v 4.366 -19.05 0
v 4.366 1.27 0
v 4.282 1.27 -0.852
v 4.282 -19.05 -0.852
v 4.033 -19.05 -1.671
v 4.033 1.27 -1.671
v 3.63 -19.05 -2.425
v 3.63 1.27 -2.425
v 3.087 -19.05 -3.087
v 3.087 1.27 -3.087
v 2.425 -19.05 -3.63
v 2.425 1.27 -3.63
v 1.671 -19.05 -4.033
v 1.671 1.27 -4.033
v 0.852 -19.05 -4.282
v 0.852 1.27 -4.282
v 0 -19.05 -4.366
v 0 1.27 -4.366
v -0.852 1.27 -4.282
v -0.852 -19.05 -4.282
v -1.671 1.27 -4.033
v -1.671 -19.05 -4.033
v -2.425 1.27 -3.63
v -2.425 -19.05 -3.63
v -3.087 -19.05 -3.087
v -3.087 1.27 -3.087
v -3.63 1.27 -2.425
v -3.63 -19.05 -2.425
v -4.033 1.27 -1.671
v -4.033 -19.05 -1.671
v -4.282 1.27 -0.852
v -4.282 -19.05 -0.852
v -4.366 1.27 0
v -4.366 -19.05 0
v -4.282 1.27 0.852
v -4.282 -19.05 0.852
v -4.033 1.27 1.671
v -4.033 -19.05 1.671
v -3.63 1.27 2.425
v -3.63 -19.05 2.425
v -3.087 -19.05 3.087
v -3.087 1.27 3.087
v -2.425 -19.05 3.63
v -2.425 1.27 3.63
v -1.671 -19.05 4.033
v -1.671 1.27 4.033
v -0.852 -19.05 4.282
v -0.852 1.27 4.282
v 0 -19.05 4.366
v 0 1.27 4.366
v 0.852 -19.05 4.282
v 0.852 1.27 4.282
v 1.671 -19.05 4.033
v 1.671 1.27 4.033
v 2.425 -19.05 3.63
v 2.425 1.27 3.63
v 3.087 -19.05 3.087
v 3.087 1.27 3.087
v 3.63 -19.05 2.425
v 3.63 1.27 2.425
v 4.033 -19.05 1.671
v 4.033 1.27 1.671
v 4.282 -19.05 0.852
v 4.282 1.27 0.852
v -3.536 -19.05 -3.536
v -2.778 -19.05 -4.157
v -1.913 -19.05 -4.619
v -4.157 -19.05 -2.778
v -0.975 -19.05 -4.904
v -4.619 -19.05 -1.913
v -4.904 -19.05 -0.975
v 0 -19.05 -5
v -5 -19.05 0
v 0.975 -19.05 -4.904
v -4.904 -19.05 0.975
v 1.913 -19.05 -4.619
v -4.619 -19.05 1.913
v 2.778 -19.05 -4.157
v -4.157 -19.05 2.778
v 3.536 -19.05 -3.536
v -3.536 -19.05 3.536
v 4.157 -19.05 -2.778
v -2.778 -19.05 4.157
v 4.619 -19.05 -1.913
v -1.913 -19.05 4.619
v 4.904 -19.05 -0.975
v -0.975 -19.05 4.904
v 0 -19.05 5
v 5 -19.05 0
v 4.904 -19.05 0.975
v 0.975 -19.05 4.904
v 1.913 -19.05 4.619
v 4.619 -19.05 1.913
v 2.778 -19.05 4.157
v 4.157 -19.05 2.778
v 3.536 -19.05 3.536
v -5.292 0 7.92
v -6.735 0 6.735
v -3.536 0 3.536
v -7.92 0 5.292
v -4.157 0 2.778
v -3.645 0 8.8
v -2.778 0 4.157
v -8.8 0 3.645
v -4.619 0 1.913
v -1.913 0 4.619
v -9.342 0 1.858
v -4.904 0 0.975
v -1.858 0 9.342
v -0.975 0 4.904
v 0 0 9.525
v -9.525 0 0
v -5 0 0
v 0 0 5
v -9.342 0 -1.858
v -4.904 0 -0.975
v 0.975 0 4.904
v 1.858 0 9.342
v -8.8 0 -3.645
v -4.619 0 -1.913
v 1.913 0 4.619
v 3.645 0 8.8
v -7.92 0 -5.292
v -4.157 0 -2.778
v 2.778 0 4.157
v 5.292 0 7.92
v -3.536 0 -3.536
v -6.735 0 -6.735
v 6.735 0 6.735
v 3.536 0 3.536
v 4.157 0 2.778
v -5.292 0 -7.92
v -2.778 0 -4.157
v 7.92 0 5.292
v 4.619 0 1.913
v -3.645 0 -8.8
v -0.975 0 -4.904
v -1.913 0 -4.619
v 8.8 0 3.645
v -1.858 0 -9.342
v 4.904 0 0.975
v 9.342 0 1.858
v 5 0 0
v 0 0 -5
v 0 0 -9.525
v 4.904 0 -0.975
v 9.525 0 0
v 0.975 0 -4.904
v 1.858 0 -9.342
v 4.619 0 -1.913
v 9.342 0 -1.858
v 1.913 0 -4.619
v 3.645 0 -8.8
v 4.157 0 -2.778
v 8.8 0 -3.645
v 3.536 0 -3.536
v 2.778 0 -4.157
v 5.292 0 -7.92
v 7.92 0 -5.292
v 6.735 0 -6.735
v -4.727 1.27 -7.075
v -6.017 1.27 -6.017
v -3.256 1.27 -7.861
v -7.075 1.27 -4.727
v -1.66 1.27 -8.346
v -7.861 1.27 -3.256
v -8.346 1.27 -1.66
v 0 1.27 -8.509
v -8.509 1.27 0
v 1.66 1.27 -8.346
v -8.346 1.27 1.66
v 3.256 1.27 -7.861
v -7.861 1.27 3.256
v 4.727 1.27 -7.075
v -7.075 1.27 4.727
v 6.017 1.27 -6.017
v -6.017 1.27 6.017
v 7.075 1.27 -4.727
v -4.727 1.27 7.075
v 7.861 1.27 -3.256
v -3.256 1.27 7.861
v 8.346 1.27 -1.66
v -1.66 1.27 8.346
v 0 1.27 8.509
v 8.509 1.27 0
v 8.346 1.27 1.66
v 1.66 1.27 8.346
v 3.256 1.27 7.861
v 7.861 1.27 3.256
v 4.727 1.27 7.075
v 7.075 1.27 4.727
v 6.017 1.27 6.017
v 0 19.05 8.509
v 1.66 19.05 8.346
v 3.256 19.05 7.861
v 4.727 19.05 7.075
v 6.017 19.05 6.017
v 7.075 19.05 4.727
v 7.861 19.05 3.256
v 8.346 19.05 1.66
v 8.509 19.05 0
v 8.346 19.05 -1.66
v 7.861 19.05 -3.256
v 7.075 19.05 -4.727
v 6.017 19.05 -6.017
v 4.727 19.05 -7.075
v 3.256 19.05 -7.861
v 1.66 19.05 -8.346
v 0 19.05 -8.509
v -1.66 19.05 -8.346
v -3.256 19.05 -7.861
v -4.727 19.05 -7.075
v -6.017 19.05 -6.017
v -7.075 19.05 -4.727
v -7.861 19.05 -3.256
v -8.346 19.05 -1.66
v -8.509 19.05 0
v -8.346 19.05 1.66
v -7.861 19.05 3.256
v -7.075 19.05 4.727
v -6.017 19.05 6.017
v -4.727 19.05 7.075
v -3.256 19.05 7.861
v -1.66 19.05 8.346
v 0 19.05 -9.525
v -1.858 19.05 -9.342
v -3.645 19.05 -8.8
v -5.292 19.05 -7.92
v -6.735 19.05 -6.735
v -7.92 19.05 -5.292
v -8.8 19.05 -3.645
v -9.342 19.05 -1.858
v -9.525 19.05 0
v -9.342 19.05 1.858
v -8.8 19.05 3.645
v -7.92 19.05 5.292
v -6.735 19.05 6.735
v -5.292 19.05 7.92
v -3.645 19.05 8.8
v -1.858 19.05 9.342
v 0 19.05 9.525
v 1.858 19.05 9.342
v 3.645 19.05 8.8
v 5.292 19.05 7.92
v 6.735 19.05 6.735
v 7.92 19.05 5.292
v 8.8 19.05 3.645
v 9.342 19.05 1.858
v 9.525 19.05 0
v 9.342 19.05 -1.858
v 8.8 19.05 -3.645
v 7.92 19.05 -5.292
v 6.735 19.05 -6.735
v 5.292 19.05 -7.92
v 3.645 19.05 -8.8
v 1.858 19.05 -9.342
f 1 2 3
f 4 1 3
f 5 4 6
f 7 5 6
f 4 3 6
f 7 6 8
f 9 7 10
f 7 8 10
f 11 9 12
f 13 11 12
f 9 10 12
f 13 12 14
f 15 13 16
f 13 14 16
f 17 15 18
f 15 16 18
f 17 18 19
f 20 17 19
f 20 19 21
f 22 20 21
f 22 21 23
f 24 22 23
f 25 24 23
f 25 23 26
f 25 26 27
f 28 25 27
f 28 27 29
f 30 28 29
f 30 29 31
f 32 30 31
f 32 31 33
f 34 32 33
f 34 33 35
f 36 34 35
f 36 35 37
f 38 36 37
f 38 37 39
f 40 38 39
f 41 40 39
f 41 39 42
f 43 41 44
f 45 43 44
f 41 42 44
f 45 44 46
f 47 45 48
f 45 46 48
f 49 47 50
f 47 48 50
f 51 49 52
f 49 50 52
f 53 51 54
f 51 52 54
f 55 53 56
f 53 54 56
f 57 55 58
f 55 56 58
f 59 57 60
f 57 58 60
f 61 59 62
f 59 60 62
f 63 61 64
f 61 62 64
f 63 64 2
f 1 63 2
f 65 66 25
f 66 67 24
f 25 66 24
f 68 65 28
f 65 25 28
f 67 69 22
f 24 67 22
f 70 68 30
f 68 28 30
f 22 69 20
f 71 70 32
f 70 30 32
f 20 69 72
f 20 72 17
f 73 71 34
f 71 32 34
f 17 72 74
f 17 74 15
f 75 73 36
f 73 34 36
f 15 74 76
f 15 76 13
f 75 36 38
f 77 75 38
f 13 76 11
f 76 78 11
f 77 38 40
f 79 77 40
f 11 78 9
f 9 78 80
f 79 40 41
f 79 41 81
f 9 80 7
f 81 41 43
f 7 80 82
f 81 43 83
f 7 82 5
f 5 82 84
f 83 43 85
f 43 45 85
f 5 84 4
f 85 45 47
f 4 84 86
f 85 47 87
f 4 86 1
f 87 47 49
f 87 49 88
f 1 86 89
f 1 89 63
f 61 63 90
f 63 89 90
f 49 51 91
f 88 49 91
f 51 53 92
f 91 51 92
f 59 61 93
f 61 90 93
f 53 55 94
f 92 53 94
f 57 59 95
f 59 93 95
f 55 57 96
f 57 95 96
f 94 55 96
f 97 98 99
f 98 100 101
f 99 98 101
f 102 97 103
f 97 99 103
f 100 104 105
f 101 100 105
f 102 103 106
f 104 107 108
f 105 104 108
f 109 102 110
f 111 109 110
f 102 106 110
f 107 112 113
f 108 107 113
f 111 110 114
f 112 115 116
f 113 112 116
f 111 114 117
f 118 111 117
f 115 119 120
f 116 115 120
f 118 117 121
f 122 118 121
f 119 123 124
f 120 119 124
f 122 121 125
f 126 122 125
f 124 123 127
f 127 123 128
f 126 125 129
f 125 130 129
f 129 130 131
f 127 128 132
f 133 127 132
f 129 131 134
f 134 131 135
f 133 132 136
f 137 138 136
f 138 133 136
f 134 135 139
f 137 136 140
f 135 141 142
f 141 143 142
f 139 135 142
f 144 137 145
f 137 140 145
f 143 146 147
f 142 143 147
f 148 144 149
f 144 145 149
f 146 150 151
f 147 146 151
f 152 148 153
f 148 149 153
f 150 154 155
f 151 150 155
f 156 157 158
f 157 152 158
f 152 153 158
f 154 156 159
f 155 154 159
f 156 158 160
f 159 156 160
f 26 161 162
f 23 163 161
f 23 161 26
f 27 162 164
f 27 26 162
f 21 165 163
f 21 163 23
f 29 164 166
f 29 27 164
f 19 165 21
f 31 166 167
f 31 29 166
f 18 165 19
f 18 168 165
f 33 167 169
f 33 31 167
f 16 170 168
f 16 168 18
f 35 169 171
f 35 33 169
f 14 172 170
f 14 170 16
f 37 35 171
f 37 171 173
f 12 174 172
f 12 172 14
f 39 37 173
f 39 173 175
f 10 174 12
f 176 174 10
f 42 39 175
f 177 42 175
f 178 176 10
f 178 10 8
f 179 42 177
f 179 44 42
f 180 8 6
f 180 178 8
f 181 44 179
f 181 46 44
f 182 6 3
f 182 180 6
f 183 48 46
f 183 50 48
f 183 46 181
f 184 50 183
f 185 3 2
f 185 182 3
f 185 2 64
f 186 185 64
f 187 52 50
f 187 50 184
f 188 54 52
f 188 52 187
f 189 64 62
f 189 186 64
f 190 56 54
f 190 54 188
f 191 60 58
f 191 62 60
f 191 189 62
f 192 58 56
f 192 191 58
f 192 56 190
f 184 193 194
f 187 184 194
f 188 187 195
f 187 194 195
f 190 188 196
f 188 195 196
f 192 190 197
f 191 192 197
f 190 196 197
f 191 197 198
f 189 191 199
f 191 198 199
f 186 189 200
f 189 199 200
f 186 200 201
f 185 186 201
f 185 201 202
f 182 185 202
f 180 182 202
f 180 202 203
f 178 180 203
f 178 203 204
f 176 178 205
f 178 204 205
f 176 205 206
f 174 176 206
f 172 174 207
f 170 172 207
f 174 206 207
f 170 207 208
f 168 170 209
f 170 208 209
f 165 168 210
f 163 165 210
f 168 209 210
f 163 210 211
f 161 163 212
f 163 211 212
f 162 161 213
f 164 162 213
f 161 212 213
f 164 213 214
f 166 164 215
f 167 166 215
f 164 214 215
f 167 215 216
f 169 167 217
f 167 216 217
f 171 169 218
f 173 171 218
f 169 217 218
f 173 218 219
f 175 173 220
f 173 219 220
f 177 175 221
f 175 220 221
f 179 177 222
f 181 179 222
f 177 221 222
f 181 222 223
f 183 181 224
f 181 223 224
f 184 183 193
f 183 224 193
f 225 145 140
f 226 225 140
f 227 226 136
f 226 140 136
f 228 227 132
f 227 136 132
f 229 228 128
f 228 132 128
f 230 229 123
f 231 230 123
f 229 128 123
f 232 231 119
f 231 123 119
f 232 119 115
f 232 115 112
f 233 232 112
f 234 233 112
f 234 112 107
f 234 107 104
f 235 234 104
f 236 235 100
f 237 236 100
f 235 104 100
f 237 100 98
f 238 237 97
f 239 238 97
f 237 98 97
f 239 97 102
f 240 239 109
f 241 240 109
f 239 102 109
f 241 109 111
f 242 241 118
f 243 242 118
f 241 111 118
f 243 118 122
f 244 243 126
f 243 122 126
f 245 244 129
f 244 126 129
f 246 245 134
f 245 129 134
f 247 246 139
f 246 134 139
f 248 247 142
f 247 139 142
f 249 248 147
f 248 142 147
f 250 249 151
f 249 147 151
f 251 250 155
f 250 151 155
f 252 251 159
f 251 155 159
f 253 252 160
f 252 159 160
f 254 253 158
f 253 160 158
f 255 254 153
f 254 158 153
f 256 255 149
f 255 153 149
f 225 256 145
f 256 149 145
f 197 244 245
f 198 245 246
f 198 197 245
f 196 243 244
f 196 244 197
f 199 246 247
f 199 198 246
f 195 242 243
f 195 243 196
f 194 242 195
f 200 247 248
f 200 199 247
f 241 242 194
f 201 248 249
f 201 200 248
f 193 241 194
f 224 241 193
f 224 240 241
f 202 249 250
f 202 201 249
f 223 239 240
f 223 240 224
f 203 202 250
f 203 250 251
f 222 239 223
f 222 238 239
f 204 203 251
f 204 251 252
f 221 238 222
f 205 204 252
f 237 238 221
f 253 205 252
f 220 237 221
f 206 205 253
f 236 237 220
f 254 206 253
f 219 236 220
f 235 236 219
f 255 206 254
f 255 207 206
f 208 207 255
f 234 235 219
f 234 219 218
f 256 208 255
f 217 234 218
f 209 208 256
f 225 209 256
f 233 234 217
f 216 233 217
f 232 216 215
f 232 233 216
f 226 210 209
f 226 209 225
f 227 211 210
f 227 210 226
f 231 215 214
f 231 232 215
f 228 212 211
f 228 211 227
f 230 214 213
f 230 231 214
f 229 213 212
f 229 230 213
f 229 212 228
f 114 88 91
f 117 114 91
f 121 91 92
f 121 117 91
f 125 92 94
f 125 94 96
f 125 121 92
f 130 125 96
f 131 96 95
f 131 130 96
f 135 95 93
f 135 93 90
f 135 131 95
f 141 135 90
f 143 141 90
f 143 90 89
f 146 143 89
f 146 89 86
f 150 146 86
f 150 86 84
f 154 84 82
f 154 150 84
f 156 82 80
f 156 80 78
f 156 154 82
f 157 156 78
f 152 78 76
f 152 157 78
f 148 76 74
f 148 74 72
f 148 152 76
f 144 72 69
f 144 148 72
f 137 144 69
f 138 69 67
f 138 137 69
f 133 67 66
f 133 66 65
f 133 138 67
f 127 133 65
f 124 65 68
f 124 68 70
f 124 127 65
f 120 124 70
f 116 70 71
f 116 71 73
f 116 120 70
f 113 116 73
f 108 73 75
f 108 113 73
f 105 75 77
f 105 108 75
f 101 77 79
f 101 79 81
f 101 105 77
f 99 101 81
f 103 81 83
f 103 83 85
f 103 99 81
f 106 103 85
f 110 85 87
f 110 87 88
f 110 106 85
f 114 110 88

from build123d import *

# Parameters (mm, degrees)
SKETCH2_R                        = 9.525
SKETCH2_R_2                      = 5
BOSS_EXTRUDE1_DEPTH              = 19.05
SKETCH2_3_R                      = 5
BOSS_EXTRUDE2_DEPTH              = 19.05
F_11_32_0_34375_DIAMETER_HOLE1_D = 8.73125
SKETCH13_R                       = 8.509
CUT_EXTRUDE1_DEPTH               = 17.78


with BuildPart() as part:
    # Sketch2 → Boss-Extrude1 (new body)
    # profile 1 of 2: a face of its own
    with BuildSketch(Plane(origin=(0, 0, 0), x_dir=(1, 0, 0), z_dir=(0, 1, 0))):
        with Locations(Location((0, 0, 0), (0, 0, 90))):
            Circle(SKETCH2_R)
        Circle(SKETCH2_R_2, mode=Mode.SUBTRACT)
    # profile 2 of 2: a face of its own
    with BuildSketch(Plane(origin=(0, 0, 0), x_dir=(1, 0, 0), z_dir=(0, 1, 0))):
        Circle(SKETCH2_R_2)
    extrude(amount=BOSS_EXTRUDE1_DEPTH)

    # Sketch2<3> → Boss-Extrude2 (add)
    with BuildSketch(Plane(origin=(0, 0, 0), x_dir=(1, 0, 0), z_dir=(0, 1, 0))):
        with Locations(Location((0, 0, 0), (0, 0, 270))):
            Circle(SKETCH2_3_R)
    extrude(amount=-BOSS_EXTRUDE2_DEPTH)

    # 11/32 (0.34375) Diameter Hole1 (through all)
    with Locations(Plane(origin=(0, -19.05, 0), x_dir=(-1, 0, 0), z_dir=(0, -1, 0))):
        with Locations((0, 0)):
            Hole(F_11_32_0_34375_DIAMETER_HOLE1_D / 2)

    # Sketch13 → Cut-Extrude1 (cut)
    with BuildSketch(Plane(origin=(0, 19.05, 0), x_dir=(1, 0, 0), z_dir=(0, 1, 0))):
        with Locations(Location((0, 0, 0), (0, 0, 270))):
            Circle(SKETCH13_R)
    extrude(amount=-CUT_EXTRUDE1_DEPTH, mode=Mode.SUBTRACT)


solid = part.part
